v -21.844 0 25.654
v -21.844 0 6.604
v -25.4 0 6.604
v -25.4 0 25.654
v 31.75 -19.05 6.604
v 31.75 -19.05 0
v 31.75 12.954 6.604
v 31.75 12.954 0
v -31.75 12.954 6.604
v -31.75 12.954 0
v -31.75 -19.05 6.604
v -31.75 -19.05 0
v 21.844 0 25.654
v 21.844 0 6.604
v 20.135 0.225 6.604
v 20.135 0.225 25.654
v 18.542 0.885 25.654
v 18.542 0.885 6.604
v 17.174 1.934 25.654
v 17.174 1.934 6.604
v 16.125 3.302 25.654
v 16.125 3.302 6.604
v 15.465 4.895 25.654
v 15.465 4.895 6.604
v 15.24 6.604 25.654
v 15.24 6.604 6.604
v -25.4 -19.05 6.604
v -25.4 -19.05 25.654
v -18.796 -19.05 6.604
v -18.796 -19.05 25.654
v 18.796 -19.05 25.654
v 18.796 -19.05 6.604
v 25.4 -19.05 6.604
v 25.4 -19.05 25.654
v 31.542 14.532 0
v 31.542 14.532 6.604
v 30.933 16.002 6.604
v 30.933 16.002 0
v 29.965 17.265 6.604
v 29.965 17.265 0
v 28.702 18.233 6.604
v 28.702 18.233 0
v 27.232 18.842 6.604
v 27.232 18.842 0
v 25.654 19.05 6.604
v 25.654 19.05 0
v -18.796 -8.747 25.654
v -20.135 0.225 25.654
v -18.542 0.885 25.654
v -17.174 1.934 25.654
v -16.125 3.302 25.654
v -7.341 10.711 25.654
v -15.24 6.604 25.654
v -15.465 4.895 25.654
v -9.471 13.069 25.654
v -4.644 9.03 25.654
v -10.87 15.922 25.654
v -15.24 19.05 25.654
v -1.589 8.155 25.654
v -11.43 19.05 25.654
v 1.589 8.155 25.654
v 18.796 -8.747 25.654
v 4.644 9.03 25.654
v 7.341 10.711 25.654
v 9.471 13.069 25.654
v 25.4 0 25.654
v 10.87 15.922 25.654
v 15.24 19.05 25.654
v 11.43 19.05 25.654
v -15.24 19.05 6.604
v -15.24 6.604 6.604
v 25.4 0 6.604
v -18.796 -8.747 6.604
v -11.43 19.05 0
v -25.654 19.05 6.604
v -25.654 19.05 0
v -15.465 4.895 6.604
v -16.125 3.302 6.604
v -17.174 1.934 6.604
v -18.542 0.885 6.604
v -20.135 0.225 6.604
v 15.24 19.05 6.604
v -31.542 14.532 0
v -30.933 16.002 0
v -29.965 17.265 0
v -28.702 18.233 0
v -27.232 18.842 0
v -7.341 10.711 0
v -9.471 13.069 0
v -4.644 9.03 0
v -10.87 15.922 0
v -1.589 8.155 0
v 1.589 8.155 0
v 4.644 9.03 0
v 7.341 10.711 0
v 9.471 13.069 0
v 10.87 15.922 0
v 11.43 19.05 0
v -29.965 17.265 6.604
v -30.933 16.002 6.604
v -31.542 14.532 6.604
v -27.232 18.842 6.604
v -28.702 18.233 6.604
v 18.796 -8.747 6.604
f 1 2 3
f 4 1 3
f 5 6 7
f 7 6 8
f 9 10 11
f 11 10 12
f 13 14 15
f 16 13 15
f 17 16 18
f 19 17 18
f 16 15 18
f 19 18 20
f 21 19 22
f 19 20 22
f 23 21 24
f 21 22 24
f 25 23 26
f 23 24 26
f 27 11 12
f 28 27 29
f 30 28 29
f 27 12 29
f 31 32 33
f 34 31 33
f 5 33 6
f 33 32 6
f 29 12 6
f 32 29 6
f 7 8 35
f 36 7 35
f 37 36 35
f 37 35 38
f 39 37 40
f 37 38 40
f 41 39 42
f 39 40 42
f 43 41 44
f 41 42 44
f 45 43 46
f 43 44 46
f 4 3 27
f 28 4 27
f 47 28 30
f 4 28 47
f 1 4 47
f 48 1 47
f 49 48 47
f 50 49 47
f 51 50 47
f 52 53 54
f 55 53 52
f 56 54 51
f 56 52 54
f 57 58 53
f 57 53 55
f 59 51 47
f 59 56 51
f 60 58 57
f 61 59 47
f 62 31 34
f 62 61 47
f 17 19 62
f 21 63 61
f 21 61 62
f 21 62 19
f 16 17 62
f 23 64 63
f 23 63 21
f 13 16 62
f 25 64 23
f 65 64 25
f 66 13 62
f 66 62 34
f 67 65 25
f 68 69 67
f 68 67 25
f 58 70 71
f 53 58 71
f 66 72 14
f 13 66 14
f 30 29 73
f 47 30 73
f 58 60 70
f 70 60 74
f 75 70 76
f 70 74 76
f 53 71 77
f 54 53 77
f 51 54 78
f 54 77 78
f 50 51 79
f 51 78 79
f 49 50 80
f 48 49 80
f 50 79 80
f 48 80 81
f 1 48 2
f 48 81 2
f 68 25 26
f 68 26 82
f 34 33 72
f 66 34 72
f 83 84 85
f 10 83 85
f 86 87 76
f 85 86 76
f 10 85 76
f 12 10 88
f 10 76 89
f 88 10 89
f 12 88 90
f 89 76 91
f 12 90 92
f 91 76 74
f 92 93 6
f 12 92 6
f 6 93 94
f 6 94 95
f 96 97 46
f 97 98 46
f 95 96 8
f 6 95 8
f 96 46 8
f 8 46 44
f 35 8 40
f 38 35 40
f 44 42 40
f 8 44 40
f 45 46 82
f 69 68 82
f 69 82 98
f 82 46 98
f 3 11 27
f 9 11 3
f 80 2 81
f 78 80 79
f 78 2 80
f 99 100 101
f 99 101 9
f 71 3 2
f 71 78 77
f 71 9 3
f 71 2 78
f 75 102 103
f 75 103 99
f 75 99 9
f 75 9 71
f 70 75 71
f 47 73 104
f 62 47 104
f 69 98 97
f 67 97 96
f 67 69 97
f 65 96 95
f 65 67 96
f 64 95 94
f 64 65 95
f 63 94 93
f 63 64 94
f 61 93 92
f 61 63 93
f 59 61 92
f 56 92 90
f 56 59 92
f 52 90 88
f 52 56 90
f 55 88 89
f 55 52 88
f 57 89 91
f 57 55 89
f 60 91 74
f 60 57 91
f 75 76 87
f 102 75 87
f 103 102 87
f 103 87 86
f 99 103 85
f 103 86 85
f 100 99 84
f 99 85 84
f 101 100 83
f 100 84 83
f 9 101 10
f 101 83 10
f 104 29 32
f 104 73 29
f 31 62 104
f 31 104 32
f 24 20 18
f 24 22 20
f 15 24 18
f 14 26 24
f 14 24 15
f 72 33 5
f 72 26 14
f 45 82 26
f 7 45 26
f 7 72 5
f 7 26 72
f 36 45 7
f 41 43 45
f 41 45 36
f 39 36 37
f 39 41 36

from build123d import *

# Parameters (mm, degrees)
F1_DEPTH = 6.604
F3_DEPTH = 19.05
F4_DEPTH = 25.4


with BuildPart() as f1:
    # F0 (on Top) → F1 (new body)
    with BuildSketch(Plane.XY):
        with BuildLine():
            ThreePointArc((31.75, 12.954), (29.9645229381, 17.2645229381), (25.654, 19.05))
            Line((25.654, 19.05), (-25.654, 19.05))
            ThreePointArc((-25.654, 19.05), (-29.9645229381, 17.2645229381), (-31.75, 12.954))
            Line((-31.75, 12.954), (-31.75, -19.05))
            Line((-31.75, -19.05), (31.75, -19.05))
            Line((31.75, -19.05), (31.75, 12.954))
        make_face()
    extrude(amount=F1_DEPTH)

    # F2 (on face) → F3 (join)
    with BuildSketch(Plane.XY.offset(6.604)):
        with BuildLine():
            Line((-25.4, -19.05), (-18.796, -19.05))
            Line((-18.796, -19.05), (-18.796, -8.7467487901))
            Line((-18.796, -8.7467487901), (0, -8.7467487901))
            Line((0, -8.7467487901), (18.796, -8.7467487901))
            Line((18.796, -8.7467487901), (18.796, -19.05))
            Line((18.796, -19.05), (25.4, -19.05))
            Line((25.4, -19.05), (25.4, 0))
            Line((25.4, 0), (21.844, 0))
            ThreePointArc((21.844, 0), (17.174266817, 1.934266817), (15.24, 6.604))
            Line((15.24, 6.604), (15.24, 19.05))
            Line((15.24, 19.05), (11.43, 19.05))
            ThreePointArc((11.43, 19.05), (0, 8.0444168312), (-11.43, 19.05))
            Line((-11.43, 19.05), (-15.24, 19.05))
            Line((-15.24, 19.05), (-15.24, 6.604))
            ThreePointArc((-15.24, 6.604), (-17.174266817, 1.934266817), (-21.844, 0))
            Line((-21.844, 0), (-25.4, 0))
            Line((-25.4, 0), (-25.4, -19.05))
        make_face()
    extrude(amount=F3_DEPTH)

    # F4 (cut): a face of the model
    f4_faces = [f1.faces().sort_by_distance(p)[0] for p in [
        (0, 14.3934898102, 6.604),
    ]]
    extrude(f4_faces, amount=-F4_DEPTH, mode=Mode.SUBTRACT)


solid = f1.part
